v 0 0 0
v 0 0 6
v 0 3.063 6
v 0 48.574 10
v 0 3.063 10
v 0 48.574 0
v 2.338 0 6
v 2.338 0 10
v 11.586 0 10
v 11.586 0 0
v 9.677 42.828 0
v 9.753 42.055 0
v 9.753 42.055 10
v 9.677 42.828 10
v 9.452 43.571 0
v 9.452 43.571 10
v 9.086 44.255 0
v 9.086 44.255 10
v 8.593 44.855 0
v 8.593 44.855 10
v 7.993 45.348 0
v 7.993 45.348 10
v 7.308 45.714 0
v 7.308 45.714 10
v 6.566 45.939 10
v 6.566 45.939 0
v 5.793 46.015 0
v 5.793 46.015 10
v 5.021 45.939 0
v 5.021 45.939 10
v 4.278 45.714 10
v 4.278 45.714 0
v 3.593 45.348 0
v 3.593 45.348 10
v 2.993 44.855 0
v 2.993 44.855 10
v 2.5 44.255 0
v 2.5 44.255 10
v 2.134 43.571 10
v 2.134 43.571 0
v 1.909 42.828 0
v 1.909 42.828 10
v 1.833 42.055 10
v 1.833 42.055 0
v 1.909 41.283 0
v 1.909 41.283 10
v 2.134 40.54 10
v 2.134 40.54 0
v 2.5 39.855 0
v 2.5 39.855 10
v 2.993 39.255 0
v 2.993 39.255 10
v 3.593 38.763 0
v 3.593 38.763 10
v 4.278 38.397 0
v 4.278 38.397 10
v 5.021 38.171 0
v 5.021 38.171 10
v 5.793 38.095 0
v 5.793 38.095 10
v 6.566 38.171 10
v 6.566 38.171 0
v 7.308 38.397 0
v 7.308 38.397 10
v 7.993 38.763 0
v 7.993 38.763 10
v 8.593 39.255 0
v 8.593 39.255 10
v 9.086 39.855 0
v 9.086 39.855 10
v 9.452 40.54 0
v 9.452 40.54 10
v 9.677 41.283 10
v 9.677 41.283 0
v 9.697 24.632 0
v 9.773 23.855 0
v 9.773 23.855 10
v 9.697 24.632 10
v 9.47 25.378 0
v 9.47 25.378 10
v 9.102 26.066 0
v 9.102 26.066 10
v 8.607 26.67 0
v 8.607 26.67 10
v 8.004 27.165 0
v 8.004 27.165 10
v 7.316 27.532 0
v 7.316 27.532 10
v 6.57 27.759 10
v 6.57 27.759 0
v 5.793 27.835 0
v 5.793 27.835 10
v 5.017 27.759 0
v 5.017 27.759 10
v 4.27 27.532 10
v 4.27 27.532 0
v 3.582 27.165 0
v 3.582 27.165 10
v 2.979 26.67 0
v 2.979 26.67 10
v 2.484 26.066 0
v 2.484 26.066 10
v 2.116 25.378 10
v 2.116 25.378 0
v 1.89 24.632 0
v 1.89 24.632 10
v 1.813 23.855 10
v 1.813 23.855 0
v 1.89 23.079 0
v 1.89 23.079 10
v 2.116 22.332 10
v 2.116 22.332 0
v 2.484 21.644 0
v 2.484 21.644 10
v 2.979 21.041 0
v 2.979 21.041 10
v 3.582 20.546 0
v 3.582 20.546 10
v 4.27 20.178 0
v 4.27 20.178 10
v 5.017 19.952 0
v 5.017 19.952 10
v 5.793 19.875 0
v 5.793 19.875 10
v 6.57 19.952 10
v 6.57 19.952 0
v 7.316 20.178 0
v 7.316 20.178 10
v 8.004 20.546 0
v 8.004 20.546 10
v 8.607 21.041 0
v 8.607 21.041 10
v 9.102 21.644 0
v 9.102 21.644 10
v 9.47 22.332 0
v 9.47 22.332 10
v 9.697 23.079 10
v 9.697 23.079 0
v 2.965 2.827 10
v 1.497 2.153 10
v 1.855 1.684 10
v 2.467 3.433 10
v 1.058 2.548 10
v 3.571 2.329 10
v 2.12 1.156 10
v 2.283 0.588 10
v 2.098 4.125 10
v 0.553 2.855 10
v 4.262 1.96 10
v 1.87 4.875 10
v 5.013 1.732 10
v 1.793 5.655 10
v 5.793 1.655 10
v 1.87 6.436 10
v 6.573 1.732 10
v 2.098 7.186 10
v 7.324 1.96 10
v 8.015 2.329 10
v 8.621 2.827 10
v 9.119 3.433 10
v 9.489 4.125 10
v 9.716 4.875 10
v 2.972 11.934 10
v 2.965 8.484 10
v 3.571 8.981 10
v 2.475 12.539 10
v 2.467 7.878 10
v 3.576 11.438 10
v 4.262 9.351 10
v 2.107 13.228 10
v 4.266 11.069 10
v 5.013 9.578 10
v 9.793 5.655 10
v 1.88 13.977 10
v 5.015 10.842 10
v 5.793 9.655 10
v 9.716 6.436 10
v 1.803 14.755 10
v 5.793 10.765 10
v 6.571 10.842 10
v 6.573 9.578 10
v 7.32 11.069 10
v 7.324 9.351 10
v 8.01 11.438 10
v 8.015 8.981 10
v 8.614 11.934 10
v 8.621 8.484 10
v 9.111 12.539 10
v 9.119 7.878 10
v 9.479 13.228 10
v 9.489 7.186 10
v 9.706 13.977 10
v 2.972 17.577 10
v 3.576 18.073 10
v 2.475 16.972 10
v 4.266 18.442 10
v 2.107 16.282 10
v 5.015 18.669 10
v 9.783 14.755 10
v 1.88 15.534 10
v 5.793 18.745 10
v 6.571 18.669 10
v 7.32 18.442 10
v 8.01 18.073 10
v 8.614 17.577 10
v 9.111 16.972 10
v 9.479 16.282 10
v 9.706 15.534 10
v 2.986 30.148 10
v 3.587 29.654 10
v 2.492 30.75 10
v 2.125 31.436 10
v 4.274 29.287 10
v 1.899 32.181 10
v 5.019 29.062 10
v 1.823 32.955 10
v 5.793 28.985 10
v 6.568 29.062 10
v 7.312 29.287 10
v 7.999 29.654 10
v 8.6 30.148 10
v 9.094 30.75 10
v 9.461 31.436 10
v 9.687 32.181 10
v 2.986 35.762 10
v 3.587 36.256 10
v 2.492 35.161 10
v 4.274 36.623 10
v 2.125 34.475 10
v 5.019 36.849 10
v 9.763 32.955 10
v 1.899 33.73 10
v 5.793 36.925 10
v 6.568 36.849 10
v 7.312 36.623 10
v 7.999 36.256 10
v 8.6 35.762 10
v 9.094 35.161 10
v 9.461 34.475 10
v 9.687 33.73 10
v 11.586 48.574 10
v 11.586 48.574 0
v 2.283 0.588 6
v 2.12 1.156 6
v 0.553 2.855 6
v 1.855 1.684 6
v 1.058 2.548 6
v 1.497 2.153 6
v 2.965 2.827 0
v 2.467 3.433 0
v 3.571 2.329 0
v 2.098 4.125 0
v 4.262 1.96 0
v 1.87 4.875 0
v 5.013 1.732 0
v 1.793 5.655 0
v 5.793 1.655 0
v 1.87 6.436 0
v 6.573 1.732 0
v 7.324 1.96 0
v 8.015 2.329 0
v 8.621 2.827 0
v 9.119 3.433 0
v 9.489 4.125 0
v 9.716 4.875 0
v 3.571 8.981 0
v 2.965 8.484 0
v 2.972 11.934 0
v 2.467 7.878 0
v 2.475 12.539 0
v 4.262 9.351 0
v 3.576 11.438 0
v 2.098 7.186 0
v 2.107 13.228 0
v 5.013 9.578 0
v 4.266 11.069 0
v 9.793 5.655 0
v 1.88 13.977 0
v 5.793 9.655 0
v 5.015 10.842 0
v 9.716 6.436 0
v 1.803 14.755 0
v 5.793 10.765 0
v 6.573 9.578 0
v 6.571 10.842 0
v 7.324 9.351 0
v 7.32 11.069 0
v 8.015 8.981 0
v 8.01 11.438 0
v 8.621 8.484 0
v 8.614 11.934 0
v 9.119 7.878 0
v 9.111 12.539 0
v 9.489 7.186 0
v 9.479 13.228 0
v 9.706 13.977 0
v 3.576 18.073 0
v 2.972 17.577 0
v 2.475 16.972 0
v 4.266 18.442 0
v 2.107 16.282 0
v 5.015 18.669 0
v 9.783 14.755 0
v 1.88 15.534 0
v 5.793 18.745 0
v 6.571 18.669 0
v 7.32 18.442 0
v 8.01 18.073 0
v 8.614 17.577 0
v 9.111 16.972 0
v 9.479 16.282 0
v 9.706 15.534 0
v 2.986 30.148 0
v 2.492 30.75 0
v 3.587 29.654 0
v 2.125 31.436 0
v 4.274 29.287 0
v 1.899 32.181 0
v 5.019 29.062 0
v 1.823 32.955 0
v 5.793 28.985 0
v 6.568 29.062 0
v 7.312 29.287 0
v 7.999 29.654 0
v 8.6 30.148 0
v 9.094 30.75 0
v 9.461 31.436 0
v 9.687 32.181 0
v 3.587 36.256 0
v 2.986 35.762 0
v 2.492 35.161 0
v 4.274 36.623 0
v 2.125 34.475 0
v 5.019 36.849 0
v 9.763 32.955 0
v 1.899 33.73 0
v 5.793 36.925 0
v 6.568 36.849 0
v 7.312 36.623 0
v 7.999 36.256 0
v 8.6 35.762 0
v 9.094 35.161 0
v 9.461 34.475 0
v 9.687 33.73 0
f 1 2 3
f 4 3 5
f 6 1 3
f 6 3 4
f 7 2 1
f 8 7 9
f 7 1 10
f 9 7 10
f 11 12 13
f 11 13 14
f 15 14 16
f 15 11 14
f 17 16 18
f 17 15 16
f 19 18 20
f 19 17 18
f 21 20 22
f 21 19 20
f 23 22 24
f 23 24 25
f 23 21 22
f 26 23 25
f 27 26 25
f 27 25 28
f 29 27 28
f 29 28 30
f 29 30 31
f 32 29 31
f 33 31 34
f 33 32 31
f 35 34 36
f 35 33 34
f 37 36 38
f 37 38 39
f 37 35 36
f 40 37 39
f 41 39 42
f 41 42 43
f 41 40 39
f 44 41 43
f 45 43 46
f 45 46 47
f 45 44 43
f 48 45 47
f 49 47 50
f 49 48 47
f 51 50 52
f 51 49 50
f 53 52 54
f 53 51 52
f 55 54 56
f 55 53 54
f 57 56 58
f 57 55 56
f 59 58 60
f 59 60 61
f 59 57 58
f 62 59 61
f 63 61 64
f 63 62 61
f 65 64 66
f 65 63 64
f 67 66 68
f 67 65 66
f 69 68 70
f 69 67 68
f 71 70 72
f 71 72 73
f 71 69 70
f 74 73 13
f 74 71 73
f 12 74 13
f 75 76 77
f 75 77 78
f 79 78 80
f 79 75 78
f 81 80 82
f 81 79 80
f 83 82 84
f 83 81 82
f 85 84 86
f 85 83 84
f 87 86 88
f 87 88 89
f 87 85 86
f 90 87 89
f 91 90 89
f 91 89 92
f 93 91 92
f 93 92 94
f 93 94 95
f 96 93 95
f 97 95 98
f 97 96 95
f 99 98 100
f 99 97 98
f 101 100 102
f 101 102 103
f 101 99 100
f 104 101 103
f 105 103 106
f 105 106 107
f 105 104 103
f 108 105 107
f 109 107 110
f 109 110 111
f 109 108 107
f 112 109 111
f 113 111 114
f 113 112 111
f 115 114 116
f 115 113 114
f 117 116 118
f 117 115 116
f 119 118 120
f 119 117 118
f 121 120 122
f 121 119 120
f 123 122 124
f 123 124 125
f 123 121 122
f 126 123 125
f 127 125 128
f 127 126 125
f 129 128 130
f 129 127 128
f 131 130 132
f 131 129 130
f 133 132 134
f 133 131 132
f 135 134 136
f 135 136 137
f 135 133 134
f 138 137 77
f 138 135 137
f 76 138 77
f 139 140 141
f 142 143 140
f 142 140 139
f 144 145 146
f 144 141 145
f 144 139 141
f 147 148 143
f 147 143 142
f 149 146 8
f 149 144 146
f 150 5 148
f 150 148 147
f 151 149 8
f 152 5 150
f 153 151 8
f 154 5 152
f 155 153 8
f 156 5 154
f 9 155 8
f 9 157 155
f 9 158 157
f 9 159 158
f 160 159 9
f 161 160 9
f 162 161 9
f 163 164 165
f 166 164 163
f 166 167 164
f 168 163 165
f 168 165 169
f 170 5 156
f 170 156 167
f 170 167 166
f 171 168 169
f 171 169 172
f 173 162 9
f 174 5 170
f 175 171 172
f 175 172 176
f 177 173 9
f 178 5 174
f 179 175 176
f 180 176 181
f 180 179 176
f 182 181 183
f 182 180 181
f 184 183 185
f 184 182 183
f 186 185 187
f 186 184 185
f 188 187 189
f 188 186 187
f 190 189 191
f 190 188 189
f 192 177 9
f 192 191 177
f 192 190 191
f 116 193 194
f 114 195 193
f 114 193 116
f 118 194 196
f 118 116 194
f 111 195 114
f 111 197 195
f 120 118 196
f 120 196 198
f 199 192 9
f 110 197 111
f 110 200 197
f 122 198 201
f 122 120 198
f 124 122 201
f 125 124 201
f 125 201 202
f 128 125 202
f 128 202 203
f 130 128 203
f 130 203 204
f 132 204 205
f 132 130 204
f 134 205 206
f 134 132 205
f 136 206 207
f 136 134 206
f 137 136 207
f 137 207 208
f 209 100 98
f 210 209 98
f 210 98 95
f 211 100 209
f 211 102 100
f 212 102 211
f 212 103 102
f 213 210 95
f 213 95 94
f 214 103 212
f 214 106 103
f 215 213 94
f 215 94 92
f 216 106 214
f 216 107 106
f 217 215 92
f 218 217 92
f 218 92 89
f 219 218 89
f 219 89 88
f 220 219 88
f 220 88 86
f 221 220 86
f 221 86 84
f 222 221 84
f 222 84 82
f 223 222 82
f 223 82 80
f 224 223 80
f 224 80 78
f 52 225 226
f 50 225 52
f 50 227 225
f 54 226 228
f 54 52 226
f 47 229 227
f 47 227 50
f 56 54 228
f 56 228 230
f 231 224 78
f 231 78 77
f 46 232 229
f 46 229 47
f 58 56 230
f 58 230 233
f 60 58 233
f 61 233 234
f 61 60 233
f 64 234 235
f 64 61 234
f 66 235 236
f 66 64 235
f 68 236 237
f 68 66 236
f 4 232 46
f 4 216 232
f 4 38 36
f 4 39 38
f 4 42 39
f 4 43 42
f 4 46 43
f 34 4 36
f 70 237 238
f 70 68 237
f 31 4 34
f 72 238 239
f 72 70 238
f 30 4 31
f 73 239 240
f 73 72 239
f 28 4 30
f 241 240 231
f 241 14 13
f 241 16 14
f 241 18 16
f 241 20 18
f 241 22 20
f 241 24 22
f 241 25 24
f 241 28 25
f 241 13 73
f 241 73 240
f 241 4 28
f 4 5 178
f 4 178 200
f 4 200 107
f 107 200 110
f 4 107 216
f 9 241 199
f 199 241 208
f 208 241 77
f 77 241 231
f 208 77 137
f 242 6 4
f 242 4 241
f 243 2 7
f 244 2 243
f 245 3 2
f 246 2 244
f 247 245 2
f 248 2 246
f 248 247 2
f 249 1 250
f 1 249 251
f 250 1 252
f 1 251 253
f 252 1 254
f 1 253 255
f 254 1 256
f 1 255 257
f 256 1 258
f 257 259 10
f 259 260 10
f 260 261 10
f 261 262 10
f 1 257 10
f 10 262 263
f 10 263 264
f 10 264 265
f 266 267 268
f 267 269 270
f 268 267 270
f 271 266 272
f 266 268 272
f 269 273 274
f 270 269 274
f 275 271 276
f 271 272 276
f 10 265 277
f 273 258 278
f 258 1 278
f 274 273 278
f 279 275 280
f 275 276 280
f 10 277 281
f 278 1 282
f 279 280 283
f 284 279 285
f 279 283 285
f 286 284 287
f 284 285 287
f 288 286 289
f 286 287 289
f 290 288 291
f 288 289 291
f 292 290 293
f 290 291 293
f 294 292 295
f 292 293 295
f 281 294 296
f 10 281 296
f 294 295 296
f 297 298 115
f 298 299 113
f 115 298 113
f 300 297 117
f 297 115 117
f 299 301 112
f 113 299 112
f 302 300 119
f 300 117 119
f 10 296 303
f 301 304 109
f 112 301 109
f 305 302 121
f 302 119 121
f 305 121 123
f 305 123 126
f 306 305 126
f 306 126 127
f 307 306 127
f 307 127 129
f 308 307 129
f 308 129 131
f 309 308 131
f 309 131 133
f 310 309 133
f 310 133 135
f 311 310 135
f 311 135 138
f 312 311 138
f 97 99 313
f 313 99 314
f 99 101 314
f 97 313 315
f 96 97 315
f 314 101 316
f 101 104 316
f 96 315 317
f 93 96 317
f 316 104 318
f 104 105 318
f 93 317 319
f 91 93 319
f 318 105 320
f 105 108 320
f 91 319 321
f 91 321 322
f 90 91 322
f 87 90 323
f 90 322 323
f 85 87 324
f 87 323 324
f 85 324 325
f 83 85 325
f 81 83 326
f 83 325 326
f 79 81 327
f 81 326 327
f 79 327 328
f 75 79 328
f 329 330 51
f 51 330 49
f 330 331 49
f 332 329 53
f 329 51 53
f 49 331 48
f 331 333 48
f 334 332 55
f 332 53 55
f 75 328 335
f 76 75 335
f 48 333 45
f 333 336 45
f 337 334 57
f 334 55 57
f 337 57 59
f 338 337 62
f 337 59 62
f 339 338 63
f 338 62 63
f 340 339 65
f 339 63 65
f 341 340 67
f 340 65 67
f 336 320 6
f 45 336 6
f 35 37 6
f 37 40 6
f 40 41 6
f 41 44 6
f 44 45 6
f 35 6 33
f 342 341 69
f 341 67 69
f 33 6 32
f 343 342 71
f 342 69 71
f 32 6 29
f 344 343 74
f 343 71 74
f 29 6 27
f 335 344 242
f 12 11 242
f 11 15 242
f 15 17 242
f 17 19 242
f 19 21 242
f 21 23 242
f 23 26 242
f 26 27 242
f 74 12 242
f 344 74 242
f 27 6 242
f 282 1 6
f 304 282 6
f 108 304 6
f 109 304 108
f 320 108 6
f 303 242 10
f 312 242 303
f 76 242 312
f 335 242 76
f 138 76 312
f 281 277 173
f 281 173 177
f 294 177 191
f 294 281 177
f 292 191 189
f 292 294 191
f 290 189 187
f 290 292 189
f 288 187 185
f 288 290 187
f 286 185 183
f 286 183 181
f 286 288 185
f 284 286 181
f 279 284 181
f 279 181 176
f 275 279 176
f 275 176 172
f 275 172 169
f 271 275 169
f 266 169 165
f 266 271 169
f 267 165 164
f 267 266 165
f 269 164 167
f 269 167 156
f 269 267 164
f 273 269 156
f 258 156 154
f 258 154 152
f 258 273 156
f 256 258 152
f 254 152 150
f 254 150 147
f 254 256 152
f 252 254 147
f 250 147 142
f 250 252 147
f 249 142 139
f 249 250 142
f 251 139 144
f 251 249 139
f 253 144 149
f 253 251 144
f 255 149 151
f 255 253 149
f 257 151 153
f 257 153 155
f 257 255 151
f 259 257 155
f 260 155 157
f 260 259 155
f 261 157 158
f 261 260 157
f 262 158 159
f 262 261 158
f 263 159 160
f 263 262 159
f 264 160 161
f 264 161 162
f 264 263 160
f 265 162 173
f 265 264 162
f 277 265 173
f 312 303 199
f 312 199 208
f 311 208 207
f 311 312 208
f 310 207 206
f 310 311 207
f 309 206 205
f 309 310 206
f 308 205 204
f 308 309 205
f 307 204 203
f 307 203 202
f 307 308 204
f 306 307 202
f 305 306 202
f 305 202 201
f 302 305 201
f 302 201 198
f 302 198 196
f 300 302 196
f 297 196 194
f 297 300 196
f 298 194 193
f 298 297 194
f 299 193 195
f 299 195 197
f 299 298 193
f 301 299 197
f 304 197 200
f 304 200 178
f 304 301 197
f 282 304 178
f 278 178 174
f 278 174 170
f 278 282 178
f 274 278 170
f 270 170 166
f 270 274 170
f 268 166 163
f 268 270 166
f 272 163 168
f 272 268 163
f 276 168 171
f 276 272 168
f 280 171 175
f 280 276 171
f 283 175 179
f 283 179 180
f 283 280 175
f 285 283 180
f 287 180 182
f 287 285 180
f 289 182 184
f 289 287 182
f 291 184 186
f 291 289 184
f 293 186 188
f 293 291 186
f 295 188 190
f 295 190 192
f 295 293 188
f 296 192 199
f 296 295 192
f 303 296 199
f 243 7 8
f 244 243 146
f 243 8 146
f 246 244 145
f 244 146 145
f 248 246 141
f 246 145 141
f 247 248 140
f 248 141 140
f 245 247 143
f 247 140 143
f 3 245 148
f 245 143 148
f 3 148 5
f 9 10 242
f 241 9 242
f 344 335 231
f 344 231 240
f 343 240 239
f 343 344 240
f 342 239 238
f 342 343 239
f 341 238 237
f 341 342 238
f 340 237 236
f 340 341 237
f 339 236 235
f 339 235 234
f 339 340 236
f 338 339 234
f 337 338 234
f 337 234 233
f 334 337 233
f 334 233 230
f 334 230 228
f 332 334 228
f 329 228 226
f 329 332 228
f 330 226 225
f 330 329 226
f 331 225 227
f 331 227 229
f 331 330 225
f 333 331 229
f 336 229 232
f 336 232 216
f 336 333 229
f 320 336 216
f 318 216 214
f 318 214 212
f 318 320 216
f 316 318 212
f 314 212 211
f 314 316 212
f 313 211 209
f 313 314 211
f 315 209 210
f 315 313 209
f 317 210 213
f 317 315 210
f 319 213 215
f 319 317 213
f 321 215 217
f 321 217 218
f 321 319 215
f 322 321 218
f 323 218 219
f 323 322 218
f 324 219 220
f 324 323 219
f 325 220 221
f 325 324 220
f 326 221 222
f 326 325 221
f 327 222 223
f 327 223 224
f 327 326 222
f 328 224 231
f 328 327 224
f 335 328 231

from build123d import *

# Parameters (mm, degrees)
F0_W     = 11.58612
F0_H     = 48.573878
F0_R     = 4
F0_R_2   = 3.99
F0_R_3   = 3.98
F0_R_4   = 3.97
F0_R_5   = 3.96
F1_DEPTH = 10
F2_R     = 3.175
F3_DEPTH = 4


with BuildPart() as f1:
    # F0 (on Top) → F1 (new body)
    with BuildSketch(Plane.XY):
        with Locations((5.79306, 24.286939)):
            Rectangle(F0_W, F0_H)
        with Locations((5.79306, 5.655282)):
            Circle(F0_R, mode=Mode.SUBTRACT)
        with Locations((5.79306, 14.755282)):
            Circle(F0_R_2, mode=Mode.SUBTRACT)
        with Locations((5.79306, 23.855282)):
            Circle(F0_R_3, mode=Mode.SUBTRACT)
        with Locations((5.79306, 32.955282)):
            Circle(F0_R_4, mode=Mode.SUBTRACT)
        with Locations((5.79306, 42.055282)):
            Circle(F0_R_5, mode=Mode.SUBTRACT)
    extrude(amount=F1_DEPTH)

    # F2 (on face) → F3 (cut)
    with BuildSketch(Plane.XY.offset(10)):
        with Locations((-0.836659, 0)):
            Circle(F2_R)
    extrude(amount=-F3_DEPTH, mode=Mode.SUBTRACT)


solid = f1.part
